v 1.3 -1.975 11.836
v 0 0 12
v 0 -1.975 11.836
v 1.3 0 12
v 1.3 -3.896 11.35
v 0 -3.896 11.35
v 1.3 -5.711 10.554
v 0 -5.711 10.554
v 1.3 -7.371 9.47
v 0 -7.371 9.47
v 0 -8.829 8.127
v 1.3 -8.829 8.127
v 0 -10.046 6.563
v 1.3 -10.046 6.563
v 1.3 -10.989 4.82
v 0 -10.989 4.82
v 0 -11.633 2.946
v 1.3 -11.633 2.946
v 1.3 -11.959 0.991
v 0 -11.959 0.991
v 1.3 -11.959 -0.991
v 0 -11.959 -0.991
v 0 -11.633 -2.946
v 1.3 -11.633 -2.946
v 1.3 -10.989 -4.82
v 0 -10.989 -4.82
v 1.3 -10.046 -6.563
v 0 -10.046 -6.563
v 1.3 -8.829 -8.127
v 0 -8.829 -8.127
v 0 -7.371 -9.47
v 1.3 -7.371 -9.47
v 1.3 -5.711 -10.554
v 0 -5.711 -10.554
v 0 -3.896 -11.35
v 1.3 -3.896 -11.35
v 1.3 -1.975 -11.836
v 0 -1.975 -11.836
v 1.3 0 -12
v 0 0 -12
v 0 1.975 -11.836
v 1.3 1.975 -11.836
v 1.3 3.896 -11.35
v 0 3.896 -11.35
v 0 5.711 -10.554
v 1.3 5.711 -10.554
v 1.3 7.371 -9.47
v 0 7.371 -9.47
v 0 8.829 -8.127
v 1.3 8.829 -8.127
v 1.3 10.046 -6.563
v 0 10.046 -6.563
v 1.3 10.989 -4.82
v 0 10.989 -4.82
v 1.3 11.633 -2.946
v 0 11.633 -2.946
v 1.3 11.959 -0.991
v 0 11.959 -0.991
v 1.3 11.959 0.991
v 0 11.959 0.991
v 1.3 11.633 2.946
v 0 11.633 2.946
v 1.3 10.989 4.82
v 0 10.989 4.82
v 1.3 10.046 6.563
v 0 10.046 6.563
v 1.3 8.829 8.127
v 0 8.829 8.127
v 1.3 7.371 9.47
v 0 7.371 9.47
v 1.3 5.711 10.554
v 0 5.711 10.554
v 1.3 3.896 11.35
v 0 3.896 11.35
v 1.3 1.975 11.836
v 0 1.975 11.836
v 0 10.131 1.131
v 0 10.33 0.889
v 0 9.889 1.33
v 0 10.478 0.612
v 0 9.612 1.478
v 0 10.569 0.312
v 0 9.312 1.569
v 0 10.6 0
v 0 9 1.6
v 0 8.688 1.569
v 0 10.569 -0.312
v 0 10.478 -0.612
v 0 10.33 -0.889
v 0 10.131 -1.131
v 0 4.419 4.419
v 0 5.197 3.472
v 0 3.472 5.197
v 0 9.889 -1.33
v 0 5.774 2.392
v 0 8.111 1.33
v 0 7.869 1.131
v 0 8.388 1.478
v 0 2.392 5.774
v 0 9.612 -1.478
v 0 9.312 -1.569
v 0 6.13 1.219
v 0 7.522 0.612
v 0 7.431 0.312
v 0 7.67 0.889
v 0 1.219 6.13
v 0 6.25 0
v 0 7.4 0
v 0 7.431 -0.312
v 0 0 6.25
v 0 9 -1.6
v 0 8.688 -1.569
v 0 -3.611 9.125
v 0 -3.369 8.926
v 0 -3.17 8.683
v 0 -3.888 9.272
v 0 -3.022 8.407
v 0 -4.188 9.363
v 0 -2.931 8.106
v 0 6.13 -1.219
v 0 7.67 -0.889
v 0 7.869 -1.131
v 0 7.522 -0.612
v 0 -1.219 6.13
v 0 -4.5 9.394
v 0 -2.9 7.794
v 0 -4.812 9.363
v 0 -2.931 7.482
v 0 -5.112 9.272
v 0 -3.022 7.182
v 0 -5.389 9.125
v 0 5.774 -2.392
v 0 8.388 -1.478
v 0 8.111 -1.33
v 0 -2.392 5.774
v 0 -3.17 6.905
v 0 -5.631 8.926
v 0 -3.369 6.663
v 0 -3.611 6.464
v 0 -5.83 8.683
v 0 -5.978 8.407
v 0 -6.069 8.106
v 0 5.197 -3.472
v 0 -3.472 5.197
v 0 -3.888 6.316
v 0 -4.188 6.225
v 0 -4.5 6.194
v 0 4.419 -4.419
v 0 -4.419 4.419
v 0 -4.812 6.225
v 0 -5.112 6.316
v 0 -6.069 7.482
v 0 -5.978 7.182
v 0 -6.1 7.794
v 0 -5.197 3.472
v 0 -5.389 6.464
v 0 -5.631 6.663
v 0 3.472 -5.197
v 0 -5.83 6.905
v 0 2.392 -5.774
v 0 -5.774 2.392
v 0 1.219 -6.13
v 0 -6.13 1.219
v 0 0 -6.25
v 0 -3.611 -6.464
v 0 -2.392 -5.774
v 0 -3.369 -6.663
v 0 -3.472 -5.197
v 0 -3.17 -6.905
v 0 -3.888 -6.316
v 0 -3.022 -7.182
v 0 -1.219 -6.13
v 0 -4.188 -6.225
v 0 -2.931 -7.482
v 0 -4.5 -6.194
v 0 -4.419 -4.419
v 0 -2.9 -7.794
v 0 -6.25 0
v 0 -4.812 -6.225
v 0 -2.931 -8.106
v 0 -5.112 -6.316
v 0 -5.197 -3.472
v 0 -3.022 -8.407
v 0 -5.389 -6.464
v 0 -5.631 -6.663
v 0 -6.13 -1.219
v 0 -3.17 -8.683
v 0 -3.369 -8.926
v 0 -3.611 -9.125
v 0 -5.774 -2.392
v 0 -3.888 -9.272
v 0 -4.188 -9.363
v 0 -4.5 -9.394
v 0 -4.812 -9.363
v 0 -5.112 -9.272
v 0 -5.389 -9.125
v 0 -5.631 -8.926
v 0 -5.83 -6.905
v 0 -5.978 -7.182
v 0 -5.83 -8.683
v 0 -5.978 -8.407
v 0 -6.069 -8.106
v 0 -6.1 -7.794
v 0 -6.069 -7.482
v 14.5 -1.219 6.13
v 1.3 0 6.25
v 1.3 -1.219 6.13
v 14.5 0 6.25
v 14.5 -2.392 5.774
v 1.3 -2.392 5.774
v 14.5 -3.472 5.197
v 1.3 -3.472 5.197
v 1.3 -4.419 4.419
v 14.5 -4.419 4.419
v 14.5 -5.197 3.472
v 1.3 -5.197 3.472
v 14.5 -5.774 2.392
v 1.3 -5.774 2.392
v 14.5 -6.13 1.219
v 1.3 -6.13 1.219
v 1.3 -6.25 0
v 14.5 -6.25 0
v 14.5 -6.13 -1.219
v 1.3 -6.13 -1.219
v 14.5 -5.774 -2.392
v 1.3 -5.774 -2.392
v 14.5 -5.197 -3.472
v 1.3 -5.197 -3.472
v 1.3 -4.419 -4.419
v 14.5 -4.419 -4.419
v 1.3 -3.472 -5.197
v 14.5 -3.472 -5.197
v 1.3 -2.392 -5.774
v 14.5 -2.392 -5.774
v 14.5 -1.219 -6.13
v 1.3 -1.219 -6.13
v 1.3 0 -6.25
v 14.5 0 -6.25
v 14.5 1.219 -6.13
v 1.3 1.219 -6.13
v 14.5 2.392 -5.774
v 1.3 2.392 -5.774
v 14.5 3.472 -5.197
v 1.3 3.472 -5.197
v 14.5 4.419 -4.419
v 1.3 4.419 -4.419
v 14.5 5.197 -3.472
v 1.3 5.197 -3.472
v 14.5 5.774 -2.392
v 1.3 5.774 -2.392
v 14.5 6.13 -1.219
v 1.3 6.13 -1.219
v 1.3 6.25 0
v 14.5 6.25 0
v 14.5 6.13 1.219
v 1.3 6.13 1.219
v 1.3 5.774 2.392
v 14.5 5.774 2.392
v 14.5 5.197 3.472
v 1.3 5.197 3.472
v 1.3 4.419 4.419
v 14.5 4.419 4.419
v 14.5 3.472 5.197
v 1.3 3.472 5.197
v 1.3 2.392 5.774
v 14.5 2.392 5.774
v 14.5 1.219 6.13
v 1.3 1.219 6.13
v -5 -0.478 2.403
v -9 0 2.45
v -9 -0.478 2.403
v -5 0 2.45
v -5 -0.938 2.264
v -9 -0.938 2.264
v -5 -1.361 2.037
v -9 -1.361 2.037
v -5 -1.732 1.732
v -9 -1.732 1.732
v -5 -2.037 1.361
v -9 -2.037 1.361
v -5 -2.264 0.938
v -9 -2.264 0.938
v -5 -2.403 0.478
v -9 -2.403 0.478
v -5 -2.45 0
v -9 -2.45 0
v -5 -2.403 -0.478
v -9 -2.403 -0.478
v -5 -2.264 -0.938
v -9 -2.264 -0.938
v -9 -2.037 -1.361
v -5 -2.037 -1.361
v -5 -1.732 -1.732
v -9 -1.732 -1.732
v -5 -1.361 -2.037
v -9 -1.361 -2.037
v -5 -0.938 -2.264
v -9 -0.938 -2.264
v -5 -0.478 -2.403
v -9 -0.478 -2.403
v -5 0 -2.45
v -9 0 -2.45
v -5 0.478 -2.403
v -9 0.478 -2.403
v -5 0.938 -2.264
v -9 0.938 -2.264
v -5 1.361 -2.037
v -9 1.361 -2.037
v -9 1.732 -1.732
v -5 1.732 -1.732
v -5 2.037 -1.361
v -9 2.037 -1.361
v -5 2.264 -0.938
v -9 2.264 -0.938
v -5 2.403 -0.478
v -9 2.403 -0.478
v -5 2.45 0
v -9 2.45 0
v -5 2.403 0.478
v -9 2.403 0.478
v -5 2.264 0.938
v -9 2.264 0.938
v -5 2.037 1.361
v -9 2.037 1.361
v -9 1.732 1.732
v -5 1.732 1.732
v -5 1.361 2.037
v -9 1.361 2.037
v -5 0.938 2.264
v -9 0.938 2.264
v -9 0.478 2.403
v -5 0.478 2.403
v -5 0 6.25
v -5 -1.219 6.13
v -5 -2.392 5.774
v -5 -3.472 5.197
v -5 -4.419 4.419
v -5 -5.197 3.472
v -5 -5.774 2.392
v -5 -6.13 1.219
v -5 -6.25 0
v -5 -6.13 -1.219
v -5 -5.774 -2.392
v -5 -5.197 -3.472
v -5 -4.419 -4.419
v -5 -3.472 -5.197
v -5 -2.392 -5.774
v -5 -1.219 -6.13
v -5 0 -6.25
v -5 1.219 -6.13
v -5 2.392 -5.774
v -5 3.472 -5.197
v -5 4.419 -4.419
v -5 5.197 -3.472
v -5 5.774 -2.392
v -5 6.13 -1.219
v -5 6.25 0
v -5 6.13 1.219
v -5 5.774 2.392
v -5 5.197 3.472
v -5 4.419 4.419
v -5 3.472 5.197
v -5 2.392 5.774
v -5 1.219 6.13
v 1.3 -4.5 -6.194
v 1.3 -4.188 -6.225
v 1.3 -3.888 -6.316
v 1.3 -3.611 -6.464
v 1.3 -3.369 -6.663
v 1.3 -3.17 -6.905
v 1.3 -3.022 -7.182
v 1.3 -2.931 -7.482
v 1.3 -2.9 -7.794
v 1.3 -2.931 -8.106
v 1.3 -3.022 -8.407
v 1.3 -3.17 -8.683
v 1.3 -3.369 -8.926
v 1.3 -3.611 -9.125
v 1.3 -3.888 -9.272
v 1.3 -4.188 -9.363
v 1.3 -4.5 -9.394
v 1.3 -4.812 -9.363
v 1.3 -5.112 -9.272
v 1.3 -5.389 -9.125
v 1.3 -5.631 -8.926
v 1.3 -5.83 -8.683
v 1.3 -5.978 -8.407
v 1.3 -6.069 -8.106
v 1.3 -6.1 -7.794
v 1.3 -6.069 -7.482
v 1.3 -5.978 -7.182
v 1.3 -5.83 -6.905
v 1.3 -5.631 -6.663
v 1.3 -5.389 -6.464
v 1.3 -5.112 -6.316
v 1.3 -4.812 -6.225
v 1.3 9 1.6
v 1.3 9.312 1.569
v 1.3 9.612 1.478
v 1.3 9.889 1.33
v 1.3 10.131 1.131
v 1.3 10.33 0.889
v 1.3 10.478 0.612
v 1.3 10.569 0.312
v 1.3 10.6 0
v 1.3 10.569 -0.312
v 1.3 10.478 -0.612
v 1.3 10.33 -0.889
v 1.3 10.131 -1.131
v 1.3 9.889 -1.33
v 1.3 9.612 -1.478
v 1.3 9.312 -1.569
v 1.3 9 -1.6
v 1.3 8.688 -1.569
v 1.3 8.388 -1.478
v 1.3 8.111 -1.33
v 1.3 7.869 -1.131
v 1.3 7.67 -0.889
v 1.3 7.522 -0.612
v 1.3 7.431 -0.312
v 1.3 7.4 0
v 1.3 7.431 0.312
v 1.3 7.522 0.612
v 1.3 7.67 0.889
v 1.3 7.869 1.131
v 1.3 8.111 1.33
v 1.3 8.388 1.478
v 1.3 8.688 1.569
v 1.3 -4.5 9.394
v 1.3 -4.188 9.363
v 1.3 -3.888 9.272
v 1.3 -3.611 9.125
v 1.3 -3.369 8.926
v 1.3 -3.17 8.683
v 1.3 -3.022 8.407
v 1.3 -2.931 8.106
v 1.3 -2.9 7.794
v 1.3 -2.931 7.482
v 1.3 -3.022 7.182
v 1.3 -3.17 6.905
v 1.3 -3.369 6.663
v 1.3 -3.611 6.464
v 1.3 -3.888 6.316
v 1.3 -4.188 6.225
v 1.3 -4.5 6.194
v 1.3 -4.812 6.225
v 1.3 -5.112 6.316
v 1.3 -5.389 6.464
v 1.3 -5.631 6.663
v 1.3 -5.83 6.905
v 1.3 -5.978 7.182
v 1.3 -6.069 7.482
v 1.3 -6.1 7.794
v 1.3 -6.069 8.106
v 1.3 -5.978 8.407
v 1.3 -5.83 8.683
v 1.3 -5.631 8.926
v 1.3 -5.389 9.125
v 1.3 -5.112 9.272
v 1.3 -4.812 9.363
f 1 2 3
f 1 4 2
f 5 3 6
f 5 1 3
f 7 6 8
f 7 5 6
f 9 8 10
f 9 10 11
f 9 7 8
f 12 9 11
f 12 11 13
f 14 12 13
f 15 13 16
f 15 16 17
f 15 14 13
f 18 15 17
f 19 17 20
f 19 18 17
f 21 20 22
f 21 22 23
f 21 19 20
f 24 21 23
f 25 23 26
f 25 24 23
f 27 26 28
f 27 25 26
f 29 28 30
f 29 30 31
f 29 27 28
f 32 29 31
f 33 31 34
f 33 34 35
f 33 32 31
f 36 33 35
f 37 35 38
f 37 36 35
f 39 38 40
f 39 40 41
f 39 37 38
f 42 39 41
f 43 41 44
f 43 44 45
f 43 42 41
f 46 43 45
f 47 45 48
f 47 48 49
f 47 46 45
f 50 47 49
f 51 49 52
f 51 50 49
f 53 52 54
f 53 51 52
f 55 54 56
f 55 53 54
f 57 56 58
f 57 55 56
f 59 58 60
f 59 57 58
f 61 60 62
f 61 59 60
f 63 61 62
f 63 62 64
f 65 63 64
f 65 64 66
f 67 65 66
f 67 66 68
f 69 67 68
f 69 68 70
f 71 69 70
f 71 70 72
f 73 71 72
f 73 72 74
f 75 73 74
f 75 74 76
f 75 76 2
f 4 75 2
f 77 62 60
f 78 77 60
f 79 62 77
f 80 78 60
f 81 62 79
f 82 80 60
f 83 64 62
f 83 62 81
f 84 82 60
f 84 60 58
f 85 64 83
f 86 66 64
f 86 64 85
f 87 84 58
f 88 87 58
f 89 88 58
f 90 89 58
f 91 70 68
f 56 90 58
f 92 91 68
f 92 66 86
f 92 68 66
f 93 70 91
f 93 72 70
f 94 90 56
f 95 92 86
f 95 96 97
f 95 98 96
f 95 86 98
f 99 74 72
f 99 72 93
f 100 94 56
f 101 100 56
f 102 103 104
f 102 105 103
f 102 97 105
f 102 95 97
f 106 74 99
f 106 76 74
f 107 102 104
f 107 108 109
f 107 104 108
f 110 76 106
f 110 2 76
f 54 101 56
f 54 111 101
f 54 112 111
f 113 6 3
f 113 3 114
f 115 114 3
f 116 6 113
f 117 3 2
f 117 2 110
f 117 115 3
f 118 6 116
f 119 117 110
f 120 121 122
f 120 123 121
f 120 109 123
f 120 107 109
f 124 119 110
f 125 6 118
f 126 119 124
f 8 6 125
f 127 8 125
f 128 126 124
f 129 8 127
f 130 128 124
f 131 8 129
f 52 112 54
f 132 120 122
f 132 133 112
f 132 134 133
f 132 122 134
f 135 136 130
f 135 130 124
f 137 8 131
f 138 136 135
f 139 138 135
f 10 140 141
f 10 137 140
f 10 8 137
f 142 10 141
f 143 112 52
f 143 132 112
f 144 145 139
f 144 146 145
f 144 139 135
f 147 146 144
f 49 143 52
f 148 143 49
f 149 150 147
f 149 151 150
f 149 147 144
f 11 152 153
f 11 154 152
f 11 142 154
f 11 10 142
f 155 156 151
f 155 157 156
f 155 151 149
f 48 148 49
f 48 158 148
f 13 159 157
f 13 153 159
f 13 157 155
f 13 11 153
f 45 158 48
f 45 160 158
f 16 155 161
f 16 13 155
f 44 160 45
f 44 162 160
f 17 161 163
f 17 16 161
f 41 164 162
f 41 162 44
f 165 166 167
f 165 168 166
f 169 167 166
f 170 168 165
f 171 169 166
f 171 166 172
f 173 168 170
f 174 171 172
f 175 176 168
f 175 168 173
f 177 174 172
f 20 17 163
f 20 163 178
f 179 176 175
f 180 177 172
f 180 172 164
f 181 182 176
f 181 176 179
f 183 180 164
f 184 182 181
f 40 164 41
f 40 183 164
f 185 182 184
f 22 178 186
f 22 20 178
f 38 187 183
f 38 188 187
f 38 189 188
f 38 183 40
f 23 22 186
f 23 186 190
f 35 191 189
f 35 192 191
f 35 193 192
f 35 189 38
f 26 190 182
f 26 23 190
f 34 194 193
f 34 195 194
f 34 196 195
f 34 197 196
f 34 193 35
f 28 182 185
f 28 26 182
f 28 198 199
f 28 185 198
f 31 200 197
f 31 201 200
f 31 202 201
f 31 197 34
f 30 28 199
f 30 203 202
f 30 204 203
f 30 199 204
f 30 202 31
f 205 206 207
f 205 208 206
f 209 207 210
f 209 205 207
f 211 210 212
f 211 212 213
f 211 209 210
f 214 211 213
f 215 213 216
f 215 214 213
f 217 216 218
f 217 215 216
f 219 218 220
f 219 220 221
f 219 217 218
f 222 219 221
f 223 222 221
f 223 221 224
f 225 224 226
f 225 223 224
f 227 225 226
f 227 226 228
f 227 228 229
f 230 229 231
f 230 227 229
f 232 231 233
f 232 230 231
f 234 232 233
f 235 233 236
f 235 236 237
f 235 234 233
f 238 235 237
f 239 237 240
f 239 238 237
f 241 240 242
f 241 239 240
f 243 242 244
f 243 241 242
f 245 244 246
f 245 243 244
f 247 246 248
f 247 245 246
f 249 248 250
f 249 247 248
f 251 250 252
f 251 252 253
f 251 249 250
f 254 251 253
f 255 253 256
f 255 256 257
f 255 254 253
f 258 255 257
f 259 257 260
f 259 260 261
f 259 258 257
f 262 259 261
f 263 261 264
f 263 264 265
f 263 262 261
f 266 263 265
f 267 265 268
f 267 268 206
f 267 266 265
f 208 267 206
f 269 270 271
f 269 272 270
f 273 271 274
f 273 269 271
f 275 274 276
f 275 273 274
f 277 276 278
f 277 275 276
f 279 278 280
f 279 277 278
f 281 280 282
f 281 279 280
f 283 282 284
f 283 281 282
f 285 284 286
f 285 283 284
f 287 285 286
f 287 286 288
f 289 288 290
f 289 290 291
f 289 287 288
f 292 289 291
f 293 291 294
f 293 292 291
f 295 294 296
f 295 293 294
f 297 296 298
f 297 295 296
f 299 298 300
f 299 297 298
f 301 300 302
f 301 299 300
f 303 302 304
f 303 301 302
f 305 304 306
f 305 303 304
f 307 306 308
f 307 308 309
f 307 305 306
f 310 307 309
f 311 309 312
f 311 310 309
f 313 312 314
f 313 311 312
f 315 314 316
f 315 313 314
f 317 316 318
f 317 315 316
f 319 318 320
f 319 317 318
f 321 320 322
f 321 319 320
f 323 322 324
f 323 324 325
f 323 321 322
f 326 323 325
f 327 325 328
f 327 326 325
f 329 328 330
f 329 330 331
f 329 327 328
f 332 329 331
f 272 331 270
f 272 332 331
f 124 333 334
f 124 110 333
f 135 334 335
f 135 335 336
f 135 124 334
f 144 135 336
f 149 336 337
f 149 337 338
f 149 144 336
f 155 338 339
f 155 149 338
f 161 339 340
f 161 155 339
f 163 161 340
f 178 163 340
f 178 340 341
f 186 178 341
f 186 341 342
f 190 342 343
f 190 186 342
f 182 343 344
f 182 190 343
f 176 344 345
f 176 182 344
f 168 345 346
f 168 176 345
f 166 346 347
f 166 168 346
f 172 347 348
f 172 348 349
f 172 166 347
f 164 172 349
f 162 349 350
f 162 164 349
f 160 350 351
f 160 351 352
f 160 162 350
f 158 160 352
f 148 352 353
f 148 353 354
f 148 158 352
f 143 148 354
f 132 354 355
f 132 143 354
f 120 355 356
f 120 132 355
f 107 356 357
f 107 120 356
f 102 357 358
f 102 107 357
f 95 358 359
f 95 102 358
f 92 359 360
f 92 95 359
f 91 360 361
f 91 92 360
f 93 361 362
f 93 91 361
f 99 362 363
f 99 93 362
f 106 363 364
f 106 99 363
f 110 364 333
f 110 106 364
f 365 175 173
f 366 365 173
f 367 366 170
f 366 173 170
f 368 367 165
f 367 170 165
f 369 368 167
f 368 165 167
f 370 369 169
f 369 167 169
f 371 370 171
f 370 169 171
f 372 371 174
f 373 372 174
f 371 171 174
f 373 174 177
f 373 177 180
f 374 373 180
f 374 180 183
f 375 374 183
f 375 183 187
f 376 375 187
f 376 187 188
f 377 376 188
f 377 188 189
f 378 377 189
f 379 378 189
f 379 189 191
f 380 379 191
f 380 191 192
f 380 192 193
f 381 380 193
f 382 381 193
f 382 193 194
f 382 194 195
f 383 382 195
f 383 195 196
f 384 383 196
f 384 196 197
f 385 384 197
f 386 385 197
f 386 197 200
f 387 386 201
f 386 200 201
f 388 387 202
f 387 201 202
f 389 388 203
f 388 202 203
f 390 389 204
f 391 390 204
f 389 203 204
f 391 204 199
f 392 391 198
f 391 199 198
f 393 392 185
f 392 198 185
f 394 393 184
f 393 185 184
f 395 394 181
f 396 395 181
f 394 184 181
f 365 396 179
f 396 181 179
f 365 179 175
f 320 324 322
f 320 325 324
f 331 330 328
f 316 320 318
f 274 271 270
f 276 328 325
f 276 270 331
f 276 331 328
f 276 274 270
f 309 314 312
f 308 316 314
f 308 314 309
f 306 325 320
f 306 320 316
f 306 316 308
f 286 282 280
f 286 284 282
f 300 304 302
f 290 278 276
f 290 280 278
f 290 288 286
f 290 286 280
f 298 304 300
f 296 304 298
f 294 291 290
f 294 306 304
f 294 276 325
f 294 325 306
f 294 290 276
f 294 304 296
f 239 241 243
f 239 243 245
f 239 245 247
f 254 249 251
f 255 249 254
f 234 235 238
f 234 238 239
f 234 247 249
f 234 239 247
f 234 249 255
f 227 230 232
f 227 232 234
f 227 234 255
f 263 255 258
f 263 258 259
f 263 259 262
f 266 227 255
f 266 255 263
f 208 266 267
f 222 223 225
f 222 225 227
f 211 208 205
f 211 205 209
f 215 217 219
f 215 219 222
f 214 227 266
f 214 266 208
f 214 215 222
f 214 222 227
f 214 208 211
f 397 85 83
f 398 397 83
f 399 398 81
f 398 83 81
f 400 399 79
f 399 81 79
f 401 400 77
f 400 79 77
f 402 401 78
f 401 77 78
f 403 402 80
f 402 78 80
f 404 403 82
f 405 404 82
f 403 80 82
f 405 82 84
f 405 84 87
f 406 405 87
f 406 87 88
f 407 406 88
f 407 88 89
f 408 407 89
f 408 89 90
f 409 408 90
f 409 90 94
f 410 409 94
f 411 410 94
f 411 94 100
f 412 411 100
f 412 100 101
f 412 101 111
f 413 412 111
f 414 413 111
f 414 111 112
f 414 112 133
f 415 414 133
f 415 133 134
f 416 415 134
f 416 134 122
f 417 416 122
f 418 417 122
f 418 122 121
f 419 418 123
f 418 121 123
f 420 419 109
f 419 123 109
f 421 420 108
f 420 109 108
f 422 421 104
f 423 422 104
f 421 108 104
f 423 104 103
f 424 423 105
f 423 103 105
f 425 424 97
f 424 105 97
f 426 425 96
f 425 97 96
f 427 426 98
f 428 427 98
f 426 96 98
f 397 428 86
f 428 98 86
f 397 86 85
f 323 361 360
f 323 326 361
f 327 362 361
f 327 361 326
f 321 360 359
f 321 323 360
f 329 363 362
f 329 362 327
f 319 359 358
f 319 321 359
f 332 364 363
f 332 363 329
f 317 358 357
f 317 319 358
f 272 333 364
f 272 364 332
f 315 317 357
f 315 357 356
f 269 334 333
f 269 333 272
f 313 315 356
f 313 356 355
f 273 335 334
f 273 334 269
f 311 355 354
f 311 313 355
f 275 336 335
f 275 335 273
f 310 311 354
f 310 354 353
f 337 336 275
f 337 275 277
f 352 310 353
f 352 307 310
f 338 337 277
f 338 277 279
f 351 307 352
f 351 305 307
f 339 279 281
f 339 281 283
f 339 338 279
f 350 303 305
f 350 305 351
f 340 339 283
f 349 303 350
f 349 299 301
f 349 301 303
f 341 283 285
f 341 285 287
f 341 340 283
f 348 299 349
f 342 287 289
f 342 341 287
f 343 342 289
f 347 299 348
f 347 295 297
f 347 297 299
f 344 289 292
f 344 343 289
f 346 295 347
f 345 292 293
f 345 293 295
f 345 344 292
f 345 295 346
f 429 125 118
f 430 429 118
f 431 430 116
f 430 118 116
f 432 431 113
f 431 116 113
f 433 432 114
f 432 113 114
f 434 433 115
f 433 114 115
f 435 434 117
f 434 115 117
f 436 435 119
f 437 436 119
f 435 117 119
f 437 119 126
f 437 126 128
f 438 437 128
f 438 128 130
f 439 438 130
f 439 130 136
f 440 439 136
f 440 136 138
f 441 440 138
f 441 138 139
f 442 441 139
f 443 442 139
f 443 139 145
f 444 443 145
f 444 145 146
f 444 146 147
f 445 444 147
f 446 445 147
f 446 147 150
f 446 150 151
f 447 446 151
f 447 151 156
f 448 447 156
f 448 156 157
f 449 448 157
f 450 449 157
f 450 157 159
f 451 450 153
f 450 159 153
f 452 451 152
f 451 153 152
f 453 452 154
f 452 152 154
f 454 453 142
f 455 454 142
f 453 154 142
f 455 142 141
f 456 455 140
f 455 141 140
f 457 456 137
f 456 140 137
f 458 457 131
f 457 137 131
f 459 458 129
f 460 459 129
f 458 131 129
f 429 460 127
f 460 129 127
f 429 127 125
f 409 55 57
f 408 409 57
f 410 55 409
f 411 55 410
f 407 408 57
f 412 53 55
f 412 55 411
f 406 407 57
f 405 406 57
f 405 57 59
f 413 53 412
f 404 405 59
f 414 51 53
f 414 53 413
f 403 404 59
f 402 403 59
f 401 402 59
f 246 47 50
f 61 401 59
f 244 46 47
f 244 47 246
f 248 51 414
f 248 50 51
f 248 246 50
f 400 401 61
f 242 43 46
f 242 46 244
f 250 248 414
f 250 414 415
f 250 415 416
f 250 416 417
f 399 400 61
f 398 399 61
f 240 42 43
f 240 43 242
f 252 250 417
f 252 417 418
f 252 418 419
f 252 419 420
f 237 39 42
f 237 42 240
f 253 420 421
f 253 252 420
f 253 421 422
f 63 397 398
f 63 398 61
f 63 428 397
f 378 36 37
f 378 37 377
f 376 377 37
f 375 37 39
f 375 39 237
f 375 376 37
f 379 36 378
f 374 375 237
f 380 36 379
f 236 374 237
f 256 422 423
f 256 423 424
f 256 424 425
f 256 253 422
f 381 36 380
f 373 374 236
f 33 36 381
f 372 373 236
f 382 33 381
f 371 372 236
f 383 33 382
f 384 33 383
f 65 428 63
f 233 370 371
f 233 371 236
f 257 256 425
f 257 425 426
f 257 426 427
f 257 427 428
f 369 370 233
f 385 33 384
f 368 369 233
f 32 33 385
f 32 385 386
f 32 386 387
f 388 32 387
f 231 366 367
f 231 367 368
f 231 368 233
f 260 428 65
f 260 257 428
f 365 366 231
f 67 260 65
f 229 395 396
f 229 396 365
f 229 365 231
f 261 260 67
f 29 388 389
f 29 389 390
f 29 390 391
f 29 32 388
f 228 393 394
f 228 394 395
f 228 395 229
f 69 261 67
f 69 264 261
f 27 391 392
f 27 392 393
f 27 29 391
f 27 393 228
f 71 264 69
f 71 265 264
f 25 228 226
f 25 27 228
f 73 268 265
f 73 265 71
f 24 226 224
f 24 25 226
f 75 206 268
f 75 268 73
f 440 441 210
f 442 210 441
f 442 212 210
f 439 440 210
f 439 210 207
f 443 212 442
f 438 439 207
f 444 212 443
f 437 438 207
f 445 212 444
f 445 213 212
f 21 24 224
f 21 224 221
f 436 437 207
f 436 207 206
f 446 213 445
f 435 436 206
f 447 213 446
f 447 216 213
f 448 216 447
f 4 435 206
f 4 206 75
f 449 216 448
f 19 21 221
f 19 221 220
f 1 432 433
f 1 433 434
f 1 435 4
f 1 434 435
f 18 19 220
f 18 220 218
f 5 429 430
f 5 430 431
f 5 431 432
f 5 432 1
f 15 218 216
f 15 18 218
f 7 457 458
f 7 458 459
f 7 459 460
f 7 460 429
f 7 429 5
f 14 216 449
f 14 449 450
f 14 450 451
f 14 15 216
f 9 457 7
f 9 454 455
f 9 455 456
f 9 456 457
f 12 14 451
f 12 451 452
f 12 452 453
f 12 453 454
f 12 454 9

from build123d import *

# Parameters (mm, degrees)
SKETCH_2_R          = 1.6
CUT_EXTRUDE_1_DEPTH = 10


with BuildPart() as part:
    # 草图1 → 旋转1 (revolve)
    with BuildSketch(Plane.XY, mode=Mode.PRIVATE) as revolve_1_sk:
        Polygon((-9, 0), (-9, 2.45), (-5, 2.45), (-5, 6.25), (0, 6.25), (0, 12), (1.3, 12), (1.3, 6.25), (14.5, 6.25), (14.5, 0), align=None)
    revolve(revolve_1_sk.sketch.rotate(Axis((-8.079555556, 0, 0), (1, 0, 0)), 90), axis=Axis((-8.079555556, 0, 0), (1, 0, 0)))

    # 草图2 → 切除-拉伸1 (cut)
    with BuildSketch(Plane.ZY):
        with Locations((0, 9)):
            Circle(SKETCH_2_R)
        with Locations((7.794228634, -4.5)):
            Circle(SKETCH_2_R)
        with Locations((-7.794228634, -4.5)):
            Circle(SKETCH_2_R)
    extrude(amount=-CUT_EXTRUDE_1_DEPTH, mode=Mode.SUBTRACT)


solid = part.part
